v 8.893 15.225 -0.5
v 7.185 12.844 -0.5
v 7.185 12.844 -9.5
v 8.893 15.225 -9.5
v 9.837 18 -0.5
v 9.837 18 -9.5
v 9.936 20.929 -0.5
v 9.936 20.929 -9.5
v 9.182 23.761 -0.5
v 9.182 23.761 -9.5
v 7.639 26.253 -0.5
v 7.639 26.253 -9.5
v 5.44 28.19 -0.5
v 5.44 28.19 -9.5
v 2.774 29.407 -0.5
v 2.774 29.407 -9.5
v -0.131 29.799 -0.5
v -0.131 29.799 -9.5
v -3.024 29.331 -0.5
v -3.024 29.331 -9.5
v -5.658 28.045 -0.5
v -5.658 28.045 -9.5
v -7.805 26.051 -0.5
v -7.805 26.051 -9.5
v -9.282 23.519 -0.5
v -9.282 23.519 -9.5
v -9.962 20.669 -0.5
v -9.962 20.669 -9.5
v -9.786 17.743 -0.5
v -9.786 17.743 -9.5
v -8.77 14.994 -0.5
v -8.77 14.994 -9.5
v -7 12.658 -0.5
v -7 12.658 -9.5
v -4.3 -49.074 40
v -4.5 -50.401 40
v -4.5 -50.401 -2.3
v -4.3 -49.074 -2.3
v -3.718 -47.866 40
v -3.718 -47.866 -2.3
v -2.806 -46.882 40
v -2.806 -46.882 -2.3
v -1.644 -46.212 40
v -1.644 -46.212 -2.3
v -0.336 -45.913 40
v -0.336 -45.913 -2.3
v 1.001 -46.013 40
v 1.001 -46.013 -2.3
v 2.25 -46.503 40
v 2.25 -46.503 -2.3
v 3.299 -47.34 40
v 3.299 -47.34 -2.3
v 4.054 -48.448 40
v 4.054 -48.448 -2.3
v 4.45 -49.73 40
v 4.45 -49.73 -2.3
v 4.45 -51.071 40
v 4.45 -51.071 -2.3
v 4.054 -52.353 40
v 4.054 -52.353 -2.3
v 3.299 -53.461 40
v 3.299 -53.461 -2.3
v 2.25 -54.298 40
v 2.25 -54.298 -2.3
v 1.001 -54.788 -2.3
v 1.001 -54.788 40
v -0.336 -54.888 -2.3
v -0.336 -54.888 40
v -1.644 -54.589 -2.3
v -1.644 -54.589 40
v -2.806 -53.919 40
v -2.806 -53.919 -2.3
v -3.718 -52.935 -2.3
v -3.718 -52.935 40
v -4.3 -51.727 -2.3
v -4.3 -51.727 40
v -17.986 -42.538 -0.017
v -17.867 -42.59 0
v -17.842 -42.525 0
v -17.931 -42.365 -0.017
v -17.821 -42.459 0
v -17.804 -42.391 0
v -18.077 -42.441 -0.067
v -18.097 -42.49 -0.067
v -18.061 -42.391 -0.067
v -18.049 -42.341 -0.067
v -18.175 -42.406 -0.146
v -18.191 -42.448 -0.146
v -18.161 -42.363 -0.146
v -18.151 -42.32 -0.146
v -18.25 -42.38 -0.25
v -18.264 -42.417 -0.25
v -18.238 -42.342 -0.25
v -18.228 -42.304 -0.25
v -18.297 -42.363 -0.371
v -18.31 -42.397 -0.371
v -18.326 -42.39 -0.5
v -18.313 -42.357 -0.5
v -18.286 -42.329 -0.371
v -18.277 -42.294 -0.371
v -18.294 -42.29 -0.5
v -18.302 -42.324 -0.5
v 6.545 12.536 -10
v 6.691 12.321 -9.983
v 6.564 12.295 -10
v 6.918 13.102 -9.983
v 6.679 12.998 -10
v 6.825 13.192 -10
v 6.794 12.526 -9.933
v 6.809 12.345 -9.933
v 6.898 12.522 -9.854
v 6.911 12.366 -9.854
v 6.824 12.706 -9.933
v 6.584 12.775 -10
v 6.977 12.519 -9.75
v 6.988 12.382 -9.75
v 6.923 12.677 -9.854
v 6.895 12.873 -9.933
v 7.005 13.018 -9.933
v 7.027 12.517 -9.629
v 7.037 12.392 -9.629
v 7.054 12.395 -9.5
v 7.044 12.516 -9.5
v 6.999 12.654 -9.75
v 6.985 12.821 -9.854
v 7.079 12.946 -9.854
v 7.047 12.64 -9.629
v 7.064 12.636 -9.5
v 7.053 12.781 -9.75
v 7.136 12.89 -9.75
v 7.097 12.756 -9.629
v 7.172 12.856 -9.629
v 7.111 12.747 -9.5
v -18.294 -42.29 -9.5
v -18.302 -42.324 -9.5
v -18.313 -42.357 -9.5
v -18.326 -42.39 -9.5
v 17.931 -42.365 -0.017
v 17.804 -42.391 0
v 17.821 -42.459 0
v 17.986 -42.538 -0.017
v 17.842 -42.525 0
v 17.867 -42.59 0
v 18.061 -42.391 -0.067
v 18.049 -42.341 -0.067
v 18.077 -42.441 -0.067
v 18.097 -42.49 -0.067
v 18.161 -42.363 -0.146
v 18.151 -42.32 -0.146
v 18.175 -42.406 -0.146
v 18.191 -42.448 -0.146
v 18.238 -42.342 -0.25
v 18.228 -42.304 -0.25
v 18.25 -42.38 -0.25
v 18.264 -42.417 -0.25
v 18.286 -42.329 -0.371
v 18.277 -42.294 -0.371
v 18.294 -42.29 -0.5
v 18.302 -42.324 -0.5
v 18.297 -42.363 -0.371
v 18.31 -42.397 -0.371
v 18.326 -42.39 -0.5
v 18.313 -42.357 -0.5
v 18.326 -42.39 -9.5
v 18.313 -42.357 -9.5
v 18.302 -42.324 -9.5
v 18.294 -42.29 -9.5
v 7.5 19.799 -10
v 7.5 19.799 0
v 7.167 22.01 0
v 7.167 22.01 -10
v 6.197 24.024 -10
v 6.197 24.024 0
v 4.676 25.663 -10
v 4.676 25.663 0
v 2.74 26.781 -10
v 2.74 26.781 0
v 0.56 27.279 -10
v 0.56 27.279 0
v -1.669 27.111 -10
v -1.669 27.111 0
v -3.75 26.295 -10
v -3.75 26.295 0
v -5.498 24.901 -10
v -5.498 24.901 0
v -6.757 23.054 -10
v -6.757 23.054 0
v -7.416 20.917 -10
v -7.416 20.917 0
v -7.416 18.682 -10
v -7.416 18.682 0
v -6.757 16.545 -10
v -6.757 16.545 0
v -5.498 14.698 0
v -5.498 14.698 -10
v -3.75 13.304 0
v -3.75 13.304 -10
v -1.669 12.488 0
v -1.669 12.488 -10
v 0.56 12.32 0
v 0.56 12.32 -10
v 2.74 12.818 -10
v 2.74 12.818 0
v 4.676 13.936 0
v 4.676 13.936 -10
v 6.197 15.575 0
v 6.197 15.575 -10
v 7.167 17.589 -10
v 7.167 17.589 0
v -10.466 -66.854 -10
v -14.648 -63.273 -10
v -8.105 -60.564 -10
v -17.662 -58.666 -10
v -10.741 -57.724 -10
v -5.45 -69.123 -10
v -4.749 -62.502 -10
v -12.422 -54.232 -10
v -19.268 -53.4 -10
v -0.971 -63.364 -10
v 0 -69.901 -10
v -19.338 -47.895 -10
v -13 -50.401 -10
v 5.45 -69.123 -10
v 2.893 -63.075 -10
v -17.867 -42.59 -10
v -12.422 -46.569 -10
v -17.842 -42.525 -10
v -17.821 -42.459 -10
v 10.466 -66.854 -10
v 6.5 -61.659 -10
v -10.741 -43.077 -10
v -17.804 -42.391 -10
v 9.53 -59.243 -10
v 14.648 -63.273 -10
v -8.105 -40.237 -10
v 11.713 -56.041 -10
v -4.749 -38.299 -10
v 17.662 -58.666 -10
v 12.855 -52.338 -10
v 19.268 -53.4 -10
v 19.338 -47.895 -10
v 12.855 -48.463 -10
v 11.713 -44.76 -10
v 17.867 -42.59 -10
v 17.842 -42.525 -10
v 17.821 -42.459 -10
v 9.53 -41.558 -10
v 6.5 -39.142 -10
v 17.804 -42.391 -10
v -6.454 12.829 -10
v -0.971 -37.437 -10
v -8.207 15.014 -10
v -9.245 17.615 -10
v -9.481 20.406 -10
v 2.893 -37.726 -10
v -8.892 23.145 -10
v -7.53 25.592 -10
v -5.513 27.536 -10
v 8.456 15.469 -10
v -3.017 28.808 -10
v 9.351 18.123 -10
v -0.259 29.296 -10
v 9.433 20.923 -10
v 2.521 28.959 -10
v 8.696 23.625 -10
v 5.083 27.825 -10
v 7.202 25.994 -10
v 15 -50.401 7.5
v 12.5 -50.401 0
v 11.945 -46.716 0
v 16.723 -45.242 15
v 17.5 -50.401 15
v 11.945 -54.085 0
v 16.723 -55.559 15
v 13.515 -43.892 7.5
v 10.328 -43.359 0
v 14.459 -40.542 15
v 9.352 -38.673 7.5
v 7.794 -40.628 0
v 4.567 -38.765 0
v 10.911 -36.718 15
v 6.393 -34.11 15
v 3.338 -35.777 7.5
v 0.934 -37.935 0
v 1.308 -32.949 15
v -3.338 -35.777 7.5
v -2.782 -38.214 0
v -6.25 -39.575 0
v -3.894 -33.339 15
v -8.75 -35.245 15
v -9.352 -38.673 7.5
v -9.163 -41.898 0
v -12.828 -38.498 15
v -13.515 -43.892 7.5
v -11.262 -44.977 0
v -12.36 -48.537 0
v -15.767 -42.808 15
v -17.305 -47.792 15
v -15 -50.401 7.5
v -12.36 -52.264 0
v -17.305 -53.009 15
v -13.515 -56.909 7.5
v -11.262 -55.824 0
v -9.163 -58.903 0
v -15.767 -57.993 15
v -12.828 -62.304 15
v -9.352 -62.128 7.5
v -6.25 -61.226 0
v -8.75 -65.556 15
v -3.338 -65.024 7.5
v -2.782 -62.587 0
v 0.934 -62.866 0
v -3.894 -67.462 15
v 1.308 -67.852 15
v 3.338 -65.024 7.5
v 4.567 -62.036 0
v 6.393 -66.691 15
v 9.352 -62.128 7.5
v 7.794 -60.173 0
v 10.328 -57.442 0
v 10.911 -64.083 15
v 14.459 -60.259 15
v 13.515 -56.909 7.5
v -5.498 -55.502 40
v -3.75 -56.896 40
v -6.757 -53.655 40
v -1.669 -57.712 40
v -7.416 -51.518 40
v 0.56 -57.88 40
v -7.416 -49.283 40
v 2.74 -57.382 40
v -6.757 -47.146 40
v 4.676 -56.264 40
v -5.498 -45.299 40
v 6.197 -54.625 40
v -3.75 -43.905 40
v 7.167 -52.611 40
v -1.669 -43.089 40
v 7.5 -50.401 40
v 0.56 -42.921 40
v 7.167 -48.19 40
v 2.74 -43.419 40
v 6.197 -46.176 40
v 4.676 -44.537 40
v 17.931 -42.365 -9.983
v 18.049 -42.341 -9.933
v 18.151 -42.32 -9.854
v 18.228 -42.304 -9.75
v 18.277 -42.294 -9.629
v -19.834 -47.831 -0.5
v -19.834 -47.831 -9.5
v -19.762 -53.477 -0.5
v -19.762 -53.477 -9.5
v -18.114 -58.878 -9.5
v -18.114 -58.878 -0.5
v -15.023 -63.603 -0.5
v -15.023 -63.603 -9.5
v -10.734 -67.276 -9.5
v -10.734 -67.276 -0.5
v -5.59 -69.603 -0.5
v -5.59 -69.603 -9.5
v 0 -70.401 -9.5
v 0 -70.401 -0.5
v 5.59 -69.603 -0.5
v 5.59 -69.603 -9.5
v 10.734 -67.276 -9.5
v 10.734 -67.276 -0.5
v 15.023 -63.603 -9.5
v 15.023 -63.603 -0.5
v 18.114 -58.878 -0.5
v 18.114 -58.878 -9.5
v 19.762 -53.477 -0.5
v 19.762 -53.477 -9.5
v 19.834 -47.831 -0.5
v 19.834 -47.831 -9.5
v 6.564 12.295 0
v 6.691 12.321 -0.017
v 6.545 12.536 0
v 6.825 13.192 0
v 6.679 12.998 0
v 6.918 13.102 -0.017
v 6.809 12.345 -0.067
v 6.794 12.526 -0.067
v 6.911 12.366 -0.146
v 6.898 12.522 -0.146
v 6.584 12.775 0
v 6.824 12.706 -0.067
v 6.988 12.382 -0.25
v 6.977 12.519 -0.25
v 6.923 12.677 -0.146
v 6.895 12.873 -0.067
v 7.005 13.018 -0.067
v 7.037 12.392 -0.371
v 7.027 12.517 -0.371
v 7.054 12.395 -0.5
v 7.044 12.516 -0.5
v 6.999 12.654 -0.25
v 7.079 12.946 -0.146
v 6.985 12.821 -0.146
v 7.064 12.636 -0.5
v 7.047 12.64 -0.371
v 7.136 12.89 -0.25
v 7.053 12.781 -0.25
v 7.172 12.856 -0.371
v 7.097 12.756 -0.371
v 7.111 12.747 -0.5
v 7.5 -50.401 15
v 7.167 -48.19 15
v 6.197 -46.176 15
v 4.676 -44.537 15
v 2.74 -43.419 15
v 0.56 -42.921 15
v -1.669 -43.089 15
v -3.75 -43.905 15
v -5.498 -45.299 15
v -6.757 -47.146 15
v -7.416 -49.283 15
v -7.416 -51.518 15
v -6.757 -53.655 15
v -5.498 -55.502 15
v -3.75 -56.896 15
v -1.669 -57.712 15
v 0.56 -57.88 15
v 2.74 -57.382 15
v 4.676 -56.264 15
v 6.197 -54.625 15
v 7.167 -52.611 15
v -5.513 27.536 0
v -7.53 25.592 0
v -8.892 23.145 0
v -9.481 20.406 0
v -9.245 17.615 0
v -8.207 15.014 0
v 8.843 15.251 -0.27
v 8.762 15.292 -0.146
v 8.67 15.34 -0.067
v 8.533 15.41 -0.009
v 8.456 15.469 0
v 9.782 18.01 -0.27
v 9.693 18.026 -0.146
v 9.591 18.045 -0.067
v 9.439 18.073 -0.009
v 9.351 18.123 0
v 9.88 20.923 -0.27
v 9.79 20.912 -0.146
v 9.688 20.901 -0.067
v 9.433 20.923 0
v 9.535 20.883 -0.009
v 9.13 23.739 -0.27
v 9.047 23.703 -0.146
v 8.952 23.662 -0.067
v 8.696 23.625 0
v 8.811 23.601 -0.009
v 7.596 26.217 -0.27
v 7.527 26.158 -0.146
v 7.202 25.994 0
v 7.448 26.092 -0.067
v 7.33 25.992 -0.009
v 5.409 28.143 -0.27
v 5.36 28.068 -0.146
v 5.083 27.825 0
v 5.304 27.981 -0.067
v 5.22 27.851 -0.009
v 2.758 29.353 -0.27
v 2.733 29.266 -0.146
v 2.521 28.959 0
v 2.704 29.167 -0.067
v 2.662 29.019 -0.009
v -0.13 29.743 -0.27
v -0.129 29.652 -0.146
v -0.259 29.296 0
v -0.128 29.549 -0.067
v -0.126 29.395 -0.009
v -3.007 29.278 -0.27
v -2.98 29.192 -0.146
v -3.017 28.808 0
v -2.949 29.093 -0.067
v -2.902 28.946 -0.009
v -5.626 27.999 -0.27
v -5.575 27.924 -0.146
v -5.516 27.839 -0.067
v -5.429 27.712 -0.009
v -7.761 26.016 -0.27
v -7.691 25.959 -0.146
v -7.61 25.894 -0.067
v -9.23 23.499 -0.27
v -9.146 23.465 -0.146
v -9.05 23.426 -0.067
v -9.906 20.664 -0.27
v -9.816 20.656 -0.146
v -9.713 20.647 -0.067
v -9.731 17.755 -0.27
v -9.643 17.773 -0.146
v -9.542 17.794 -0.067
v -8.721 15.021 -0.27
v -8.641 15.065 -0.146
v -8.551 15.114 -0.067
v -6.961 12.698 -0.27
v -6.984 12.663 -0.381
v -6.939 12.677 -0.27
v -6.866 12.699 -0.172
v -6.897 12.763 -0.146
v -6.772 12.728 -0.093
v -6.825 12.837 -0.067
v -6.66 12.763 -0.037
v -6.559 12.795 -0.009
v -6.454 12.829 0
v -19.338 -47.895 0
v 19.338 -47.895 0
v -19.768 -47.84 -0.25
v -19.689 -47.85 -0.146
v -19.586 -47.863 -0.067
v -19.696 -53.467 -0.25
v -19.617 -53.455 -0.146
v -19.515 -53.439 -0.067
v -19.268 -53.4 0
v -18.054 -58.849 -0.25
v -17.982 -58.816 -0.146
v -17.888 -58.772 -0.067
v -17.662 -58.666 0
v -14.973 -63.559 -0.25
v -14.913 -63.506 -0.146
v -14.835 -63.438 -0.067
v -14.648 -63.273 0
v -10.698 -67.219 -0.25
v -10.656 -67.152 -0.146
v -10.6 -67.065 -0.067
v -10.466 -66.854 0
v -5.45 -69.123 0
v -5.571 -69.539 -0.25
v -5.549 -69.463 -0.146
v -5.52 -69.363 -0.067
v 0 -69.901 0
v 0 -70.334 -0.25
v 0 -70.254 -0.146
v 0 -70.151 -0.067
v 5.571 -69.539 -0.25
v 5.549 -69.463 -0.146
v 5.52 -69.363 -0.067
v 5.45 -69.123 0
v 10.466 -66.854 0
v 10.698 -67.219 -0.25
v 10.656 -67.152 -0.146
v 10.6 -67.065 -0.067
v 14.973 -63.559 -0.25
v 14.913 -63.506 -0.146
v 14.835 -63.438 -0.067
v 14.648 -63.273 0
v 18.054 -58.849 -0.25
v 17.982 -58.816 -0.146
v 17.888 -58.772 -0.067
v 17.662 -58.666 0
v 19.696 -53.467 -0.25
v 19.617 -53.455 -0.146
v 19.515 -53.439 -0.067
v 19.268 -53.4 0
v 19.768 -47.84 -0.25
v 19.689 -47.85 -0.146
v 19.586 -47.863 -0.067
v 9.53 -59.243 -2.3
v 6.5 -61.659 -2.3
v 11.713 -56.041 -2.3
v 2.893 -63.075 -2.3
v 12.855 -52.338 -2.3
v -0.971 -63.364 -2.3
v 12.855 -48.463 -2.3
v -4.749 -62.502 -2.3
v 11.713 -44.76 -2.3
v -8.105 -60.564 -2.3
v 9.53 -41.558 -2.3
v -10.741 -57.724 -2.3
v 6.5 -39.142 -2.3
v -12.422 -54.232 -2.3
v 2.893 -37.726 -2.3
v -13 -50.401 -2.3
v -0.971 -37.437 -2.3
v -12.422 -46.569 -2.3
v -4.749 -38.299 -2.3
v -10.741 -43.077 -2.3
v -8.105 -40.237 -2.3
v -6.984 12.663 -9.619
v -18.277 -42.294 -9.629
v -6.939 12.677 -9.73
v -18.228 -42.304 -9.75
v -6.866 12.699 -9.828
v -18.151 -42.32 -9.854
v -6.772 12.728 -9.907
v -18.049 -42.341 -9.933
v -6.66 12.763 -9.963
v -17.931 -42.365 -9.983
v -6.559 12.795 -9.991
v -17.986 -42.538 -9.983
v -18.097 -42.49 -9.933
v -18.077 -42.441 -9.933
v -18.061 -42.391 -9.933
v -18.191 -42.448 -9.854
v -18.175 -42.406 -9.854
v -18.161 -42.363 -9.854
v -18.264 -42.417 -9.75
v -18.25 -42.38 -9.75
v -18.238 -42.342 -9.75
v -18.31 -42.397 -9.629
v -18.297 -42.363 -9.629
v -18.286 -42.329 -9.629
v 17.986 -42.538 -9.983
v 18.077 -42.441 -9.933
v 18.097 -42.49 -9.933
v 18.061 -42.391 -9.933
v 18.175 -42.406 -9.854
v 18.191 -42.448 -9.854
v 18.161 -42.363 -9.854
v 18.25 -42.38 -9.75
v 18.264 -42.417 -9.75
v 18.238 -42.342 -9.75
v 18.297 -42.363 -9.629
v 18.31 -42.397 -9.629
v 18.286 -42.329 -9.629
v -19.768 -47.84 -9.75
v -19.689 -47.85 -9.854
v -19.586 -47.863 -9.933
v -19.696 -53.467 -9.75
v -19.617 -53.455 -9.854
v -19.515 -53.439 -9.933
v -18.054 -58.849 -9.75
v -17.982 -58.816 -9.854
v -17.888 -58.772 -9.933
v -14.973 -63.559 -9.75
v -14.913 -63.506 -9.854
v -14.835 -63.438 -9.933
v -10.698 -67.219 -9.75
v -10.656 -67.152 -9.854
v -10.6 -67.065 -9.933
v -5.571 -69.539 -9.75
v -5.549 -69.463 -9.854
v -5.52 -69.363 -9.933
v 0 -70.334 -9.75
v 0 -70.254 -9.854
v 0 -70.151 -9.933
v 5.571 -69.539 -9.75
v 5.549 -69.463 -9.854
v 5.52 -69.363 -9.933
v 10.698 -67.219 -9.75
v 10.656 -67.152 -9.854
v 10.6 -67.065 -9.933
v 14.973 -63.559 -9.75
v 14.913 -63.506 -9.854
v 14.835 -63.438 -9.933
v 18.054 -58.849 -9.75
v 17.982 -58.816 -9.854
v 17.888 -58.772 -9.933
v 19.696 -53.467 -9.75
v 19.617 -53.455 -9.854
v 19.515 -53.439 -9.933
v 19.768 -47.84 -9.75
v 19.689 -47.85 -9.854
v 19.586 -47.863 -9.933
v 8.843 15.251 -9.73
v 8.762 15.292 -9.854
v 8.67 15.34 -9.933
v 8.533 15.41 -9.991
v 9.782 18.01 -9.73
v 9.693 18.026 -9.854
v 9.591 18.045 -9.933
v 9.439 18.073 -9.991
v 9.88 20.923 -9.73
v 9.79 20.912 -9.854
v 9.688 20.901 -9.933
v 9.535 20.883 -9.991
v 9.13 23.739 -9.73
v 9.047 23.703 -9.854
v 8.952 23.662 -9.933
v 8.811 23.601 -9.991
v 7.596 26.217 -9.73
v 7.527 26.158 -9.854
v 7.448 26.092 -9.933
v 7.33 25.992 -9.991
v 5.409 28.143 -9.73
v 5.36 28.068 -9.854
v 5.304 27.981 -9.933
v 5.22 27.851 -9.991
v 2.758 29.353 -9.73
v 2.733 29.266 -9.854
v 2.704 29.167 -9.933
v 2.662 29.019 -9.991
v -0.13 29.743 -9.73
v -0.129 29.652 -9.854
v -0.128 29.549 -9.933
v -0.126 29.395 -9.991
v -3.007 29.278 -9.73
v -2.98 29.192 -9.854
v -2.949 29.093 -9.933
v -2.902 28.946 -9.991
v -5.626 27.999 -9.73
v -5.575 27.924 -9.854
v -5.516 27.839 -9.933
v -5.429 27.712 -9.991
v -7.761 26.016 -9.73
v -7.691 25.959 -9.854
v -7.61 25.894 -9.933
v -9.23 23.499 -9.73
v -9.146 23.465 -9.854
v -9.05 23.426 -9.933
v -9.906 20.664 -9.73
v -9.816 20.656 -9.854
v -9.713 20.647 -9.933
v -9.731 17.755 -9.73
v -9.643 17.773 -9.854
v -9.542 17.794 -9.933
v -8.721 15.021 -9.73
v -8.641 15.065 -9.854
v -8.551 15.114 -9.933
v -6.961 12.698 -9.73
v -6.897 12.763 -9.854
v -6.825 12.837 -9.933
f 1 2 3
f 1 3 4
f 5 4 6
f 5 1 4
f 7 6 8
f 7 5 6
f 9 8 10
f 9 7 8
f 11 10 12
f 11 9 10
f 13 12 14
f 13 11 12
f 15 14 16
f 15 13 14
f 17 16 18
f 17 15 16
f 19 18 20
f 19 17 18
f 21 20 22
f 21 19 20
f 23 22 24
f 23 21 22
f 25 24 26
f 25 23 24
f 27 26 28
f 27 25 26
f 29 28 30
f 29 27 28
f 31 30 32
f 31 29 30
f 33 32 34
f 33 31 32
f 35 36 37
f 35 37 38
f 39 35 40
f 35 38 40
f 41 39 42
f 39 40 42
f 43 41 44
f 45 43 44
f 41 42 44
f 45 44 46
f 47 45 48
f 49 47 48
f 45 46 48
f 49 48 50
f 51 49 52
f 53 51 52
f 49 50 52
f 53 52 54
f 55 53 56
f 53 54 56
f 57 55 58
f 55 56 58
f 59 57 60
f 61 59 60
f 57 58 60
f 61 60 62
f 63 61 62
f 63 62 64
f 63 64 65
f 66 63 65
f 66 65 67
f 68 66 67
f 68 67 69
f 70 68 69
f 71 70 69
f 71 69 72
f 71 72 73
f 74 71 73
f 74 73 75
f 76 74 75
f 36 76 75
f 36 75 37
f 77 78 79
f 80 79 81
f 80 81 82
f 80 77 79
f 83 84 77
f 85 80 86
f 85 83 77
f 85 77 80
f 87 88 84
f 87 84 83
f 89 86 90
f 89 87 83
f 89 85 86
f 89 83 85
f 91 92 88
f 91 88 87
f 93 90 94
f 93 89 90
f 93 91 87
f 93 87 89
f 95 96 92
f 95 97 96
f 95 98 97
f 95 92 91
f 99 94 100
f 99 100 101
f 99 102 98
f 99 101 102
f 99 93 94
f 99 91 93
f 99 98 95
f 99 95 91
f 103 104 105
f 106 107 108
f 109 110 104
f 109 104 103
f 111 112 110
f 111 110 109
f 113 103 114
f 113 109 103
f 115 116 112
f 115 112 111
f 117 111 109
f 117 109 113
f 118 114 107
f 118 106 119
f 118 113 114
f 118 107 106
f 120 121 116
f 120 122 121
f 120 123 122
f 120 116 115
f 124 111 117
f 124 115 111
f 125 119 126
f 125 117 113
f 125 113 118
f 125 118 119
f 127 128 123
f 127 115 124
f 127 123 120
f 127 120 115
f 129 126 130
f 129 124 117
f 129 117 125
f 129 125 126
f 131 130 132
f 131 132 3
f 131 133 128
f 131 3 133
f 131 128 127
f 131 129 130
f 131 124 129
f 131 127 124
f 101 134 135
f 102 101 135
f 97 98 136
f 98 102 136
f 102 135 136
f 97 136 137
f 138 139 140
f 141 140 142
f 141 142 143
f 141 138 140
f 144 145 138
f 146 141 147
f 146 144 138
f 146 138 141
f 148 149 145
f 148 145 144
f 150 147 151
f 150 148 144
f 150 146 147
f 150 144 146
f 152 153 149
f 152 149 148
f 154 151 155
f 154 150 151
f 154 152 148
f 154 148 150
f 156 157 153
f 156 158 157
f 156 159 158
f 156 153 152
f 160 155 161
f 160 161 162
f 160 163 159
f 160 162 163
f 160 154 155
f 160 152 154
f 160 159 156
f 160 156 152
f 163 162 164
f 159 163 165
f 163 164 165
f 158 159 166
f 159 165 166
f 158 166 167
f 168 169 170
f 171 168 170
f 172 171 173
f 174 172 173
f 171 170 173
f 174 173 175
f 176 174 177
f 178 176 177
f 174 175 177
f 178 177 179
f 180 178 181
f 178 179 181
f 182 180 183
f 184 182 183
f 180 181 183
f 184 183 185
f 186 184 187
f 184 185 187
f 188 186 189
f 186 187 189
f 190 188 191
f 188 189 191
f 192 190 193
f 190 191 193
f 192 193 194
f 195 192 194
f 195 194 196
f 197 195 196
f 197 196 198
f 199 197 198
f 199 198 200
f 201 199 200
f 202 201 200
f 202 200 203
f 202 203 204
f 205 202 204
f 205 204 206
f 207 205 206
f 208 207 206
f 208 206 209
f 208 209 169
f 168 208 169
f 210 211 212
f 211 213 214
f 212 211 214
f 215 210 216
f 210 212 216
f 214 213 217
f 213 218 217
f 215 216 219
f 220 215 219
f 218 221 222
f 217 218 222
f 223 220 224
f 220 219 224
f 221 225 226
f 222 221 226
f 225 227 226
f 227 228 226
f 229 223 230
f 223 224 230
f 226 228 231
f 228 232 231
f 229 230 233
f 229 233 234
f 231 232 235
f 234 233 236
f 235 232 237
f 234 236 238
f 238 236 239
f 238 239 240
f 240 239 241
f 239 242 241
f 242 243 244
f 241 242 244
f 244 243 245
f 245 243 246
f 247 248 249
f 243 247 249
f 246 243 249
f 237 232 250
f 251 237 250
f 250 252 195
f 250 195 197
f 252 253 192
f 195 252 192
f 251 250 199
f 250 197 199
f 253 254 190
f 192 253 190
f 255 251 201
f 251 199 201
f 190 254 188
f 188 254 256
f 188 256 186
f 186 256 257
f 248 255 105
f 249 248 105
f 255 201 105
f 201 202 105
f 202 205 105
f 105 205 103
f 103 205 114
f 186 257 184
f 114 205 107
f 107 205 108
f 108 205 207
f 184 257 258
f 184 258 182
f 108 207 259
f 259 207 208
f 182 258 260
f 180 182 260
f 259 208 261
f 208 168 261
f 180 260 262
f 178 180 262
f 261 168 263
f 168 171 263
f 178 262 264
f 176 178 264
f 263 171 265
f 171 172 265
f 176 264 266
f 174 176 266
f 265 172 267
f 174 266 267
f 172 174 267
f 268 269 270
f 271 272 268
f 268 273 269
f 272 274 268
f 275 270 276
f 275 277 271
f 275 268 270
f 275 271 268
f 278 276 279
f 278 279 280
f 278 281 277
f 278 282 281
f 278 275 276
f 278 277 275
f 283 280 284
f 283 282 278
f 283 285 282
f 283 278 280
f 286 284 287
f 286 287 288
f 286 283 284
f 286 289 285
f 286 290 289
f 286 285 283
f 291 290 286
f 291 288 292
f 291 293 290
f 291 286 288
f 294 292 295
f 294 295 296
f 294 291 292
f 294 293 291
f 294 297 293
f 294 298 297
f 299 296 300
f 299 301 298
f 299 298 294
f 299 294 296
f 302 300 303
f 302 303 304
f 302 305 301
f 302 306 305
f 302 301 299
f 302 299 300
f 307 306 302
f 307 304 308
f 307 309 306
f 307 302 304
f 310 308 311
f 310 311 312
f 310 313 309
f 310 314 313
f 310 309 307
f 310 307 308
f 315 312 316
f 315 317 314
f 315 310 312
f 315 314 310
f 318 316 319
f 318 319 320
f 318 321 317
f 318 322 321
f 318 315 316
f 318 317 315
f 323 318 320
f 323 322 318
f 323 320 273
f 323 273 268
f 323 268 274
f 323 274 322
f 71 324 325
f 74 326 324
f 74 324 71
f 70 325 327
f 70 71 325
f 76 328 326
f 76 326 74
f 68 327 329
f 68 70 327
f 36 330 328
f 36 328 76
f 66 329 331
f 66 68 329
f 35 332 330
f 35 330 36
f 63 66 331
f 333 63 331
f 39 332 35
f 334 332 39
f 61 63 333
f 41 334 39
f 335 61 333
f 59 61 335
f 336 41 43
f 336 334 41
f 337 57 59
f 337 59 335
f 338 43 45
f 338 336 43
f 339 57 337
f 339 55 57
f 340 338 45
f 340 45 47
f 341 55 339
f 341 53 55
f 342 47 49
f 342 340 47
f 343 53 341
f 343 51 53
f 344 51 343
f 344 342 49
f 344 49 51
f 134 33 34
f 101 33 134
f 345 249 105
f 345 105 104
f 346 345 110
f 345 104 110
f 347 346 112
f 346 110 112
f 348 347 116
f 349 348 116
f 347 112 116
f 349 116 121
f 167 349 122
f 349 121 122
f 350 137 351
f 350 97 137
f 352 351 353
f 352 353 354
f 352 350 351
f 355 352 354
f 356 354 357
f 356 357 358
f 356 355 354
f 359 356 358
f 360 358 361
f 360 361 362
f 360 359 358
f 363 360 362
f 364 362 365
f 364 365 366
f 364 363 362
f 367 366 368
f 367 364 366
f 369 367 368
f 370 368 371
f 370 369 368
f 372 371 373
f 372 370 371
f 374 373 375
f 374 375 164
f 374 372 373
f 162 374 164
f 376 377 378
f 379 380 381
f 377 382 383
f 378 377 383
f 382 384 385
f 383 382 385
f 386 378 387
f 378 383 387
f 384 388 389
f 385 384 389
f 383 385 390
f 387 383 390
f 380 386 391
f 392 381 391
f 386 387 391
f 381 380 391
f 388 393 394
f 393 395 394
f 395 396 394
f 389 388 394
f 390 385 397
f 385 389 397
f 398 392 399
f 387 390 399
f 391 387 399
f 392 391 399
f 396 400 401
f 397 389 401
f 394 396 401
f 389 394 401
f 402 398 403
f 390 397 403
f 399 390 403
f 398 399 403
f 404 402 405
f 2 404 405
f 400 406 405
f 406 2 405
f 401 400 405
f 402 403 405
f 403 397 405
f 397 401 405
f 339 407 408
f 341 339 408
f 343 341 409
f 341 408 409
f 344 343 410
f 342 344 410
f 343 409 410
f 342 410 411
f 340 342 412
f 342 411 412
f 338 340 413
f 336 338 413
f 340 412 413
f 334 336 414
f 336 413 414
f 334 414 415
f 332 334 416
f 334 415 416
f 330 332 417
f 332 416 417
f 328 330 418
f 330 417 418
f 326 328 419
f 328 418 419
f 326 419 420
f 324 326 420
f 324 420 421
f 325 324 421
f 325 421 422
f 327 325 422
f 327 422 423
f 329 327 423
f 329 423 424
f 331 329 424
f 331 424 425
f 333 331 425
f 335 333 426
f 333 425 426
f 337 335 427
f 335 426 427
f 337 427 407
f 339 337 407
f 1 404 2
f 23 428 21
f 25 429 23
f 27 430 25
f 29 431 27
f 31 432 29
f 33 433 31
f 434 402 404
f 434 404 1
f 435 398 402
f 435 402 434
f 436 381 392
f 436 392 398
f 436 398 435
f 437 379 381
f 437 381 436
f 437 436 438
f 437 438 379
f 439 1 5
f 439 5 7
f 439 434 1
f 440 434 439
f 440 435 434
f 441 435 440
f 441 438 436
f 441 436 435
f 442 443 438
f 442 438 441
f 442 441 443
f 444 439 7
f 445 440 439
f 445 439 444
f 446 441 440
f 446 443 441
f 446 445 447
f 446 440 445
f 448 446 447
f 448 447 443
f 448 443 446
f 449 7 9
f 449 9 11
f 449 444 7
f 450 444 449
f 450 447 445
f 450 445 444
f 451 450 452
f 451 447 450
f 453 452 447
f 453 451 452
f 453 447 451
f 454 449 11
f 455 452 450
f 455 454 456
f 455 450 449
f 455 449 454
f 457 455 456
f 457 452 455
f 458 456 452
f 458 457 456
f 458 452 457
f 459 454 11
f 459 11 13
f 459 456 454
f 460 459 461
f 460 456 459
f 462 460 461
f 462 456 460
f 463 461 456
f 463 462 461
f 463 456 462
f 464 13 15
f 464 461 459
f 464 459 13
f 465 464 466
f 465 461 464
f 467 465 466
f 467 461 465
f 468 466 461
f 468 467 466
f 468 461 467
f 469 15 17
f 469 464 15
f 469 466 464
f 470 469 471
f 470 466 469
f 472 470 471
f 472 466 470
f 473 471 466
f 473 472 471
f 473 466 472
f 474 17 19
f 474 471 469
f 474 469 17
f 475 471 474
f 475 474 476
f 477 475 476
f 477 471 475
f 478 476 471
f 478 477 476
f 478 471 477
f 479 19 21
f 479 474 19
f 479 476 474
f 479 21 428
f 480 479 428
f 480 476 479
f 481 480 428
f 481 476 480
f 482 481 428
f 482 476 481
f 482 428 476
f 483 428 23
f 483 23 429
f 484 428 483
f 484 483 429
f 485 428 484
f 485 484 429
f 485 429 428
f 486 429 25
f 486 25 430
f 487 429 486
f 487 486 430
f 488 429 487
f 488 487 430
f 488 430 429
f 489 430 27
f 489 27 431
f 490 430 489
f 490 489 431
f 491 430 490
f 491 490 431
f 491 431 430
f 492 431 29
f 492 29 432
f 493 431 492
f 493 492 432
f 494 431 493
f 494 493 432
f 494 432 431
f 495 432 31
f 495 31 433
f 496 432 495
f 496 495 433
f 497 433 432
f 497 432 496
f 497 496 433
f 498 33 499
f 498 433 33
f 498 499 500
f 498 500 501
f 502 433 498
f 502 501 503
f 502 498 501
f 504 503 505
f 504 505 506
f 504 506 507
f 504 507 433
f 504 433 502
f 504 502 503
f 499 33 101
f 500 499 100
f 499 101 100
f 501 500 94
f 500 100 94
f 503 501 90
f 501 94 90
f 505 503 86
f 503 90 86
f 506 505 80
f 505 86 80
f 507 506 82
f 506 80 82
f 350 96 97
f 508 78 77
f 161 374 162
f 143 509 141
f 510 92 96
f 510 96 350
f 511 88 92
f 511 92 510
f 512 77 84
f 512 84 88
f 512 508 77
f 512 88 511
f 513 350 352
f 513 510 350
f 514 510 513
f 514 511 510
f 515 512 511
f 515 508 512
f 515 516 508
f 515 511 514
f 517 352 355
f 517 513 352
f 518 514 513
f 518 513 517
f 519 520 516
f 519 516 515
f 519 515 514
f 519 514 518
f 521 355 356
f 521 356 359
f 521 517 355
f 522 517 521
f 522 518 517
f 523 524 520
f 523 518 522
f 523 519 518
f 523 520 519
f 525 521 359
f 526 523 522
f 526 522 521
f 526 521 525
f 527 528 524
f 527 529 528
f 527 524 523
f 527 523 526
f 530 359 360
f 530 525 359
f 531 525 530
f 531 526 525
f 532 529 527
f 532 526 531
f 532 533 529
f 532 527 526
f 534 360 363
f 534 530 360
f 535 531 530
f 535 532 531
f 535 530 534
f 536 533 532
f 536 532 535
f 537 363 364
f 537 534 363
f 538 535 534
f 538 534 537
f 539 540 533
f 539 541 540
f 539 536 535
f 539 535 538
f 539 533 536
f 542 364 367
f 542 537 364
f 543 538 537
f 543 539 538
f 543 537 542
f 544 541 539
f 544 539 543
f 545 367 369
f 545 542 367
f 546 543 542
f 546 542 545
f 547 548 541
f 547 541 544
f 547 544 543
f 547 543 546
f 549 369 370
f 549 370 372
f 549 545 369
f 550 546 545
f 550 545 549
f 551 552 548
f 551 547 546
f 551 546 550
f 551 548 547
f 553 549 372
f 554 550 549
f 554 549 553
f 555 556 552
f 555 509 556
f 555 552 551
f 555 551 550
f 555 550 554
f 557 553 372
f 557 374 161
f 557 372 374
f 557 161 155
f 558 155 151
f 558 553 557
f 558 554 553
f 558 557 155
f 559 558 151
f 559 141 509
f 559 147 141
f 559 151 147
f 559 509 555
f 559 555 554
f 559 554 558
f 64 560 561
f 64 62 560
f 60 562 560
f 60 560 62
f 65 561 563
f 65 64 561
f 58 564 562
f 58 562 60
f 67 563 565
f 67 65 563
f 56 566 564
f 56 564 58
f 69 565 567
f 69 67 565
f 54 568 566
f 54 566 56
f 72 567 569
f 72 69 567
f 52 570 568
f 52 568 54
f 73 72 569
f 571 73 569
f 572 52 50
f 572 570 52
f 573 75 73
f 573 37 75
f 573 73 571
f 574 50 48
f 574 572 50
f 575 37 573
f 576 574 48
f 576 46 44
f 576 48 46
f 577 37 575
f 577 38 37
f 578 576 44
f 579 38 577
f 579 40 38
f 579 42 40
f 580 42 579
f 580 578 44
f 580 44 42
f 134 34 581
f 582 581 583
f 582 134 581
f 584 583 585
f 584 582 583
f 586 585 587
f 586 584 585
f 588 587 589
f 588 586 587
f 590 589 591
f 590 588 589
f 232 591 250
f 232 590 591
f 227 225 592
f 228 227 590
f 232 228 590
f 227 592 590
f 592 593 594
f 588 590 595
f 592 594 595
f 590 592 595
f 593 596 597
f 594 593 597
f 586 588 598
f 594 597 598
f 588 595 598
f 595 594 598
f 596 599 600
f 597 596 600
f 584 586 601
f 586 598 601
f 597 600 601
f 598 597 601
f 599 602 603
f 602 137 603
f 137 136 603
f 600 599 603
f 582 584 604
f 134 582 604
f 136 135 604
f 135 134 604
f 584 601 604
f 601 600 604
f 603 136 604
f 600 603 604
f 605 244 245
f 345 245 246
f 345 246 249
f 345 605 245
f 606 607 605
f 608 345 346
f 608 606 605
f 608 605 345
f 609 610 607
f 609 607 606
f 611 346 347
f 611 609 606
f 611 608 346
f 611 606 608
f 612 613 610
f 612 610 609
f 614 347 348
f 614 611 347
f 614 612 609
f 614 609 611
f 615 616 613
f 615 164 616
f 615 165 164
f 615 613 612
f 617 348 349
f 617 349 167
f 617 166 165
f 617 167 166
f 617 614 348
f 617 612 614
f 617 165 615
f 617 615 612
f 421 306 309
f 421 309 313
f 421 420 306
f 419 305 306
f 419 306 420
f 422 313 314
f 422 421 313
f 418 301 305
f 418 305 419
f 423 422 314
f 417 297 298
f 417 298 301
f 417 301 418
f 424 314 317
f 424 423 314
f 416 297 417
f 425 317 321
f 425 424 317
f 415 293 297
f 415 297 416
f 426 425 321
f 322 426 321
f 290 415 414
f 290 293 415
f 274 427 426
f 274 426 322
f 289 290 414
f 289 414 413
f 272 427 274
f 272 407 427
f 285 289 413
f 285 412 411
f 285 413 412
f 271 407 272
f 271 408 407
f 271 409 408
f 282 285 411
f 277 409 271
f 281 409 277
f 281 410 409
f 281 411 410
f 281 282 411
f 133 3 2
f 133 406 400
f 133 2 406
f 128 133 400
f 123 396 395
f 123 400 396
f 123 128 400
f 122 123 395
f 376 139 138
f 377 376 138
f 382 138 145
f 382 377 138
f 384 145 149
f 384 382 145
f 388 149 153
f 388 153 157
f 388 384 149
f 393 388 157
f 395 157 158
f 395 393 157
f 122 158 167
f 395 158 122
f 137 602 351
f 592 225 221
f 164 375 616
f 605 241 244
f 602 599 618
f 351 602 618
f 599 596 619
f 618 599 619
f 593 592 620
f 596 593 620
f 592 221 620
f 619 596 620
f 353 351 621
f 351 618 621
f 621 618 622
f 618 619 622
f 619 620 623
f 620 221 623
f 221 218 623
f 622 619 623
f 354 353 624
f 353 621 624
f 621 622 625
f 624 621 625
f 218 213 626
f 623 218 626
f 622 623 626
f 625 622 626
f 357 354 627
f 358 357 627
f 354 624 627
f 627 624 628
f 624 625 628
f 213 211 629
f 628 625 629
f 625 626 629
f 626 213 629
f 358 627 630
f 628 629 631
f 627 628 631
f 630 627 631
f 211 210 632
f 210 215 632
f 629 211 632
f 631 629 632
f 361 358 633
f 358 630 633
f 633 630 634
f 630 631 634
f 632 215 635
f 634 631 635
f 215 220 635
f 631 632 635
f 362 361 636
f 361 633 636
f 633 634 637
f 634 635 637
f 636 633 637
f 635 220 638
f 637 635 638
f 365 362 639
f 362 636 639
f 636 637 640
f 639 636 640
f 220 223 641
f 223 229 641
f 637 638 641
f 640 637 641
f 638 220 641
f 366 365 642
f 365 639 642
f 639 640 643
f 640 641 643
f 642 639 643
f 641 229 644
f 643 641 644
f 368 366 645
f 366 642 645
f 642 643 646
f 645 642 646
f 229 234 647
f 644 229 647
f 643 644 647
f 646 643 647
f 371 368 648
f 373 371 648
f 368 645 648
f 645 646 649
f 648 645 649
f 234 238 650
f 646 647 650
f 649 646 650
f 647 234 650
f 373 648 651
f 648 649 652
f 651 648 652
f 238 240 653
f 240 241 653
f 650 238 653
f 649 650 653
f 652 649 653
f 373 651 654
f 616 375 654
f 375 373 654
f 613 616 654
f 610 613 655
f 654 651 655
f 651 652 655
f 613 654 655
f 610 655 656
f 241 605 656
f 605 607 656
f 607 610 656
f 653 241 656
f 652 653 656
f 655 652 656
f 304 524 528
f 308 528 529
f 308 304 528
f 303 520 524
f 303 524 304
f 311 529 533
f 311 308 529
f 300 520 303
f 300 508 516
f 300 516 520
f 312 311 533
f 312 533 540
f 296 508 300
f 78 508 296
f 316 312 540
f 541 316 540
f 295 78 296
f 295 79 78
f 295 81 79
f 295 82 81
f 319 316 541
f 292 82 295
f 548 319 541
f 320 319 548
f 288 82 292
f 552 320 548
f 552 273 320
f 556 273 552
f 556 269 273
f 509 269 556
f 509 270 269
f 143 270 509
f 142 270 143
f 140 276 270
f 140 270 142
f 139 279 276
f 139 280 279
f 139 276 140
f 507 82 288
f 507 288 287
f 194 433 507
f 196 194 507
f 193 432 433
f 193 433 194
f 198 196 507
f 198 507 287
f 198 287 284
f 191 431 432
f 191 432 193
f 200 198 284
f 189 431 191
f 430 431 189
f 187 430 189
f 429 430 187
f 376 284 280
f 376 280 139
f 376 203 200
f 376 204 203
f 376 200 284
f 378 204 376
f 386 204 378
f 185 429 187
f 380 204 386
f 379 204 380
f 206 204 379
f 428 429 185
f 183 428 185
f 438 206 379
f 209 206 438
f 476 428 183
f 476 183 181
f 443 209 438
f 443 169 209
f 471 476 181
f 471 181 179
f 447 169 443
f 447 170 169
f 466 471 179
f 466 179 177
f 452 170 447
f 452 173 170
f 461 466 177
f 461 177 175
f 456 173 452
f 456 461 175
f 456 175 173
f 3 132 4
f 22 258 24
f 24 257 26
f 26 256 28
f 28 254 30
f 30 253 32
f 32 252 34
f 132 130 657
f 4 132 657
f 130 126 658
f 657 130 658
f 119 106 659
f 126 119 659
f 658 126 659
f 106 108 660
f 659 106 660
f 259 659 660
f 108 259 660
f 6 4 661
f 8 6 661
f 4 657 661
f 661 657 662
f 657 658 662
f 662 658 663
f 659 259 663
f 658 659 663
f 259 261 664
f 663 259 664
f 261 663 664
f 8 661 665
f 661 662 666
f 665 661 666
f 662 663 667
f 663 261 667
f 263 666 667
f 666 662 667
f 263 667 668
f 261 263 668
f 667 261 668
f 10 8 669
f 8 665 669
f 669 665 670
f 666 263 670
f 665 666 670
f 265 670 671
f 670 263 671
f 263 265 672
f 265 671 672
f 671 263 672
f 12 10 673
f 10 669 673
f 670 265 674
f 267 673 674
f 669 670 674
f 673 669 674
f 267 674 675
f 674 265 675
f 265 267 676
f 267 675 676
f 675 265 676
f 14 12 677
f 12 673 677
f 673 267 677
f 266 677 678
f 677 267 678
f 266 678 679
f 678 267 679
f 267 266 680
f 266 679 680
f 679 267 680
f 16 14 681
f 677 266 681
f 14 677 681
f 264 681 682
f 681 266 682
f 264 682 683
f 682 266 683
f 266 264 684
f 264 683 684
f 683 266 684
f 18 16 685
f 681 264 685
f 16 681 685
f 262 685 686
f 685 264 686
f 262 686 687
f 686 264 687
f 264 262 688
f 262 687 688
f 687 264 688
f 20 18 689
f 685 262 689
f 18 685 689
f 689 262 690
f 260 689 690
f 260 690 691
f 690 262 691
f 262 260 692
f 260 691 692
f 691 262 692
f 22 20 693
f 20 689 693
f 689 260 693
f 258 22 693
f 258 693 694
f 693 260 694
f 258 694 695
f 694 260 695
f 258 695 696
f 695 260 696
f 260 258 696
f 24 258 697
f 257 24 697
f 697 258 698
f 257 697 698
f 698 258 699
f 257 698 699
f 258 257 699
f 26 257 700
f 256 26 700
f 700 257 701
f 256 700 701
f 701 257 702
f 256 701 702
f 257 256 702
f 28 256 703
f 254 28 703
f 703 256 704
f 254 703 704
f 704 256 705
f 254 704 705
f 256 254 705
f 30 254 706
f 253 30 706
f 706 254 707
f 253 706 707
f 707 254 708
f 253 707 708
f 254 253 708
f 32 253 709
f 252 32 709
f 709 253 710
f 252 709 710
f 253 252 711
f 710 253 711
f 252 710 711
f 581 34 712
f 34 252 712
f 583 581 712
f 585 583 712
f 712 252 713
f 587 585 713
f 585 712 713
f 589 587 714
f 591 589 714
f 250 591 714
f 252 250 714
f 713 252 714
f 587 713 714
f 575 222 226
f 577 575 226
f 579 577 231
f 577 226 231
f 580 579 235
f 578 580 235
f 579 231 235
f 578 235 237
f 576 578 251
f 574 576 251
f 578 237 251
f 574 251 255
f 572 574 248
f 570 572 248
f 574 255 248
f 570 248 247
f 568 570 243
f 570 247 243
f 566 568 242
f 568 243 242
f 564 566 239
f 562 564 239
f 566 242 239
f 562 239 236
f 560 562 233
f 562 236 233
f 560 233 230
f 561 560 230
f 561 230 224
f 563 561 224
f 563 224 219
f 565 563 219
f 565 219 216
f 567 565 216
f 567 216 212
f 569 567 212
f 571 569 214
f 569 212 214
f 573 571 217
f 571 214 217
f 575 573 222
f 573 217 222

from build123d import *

# Parameters (mm, degrees)
BOSS_EXTRUDE2_DEPTH = 10
SKETCH11_R          = 7.5
CUT_EXTRUDE1_DEPTH  = 11
SKETCH12_R          = 12.5
SKETCH13_R          = 17.5
SKETCH16_R          = 7.5
BOSS_EXTRUDE3_DEPTH = 25
SKETCH17_R          = 13
CUT_EXTRUDE2_DEPTH  = 7.7
FILLET2_R           = 0.5
CUT_EXTRUDE3_REACH  = 44.3
SKETCH18_R          = 4.5


with BuildPart() as part:
    # Sketch10 → Boss-Extrude2 (new body)
    with BuildSketch(Plane.XY):
        with BuildLine():
            Line((-7, 12.658044745), (-18.304628492, -42.341955255))
            ThreePointArc((-18.304628492, -42.341955255), (0, -70.400526826), (18.304628492, -42.341955255))
            Line((18.304628492, -42.341955255), (7, 12.658044745))
            ThreePointArc((7, 12.658044745), (0, 29.799473174), (-7, 12.658044745))
        make_face()
    extrude(amount=-BOSS_EXTRUDE2_DEPTH)

    # Sketch11 → Cut-Extrude1 (cut, through all)
    with BuildSketch(Plane.XY):
        with Locations((0, 19.799473174)):
            Circle(SKETCH11_R)
    extrude(amount=-CUT_EXTRUDE1_DEPTH, mode=Mode.SUBTRACT)

    # Sketch12 → Loft1 section 0
    with BuildSketch(Plane.XY):
        with Locations((0, -50.400526826)):
            Circle(SKETCH12_R)
    # Sketch13 → Loft1 section 1
    with BuildSketch(Plane.XY.offset(15)):
        with Locations((0, -50.400526826)):
            Circle(SKETCH13_R)
    loft()

    # Sketch16 → Boss-Extrude3 (add)
    with BuildSketch(Plane.XY.offset(15)):
        with Locations((0, -50.400526826)):
            Circle(SKETCH16_R)
    extrude(amount=BOSS_EXTRUDE3_DEPTH)

    # Sketch17 → Cut-Extrude2 (cut)
    with BuildSketch(Plane(origin=(0, 0, -10), x_dir=(-1, 0, 0), z_dir=(0, 0, -1))):
        with Locations((0, -50.400526826)):
            Circle(SKETCH17_R)
    extrude(amount=-CUT_EXTRUDE2_DEPTH, mode=Mode.SUBTRACT)

    # Fillet2
    fillet2_edges = [part.edges().sort_by_distance(p)[0] for p in [
        (0, -70.400526826, -10),
        (12.652314246, -14.841955255, -10),
        (0, 29.799473174, -10),
        (12.652314246, -14.841955255, 0),
        (0, -70.400526826, 0),
        (-12.652314246, -14.841955255, 0),
        (0, 29.799473174, 0),
        (-12.652314246, -14.841955255, -10),
        (7, 12.658044745, -5),
        (18.304628492, -42.341955255, -5),
        (-18.304628492, -42.341955255, -5),
    ]]
    fillet(fillet2_edges, radius=FILLET2_R)

    # Sketch18 → Cut-Extrude3 (cut, up to next)
    with BuildSketch(Plane(origin=(0, 0, -2.3), x_dir=(-1, 0, 0), z_dir=(0, 0, -1)), mode=Mode.PRIVATE) as cut_extrude3_sk1:
        with Locations((0, -50.400526826)):
            Circle(SKETCH18_R)
    cut_extrude3_tool1 = extrude(cut_extrude3_sk1.sketch, amount=-CUT_EXTRUDE3_REACH, mode=Mode.PRIVATE) & part.part
    add(cut_extrude3_tool1.solids().sort_by_distance((0, -50.400527, -2.3))[0], mode=Mode.SUBTRACT)


solid = part.part
